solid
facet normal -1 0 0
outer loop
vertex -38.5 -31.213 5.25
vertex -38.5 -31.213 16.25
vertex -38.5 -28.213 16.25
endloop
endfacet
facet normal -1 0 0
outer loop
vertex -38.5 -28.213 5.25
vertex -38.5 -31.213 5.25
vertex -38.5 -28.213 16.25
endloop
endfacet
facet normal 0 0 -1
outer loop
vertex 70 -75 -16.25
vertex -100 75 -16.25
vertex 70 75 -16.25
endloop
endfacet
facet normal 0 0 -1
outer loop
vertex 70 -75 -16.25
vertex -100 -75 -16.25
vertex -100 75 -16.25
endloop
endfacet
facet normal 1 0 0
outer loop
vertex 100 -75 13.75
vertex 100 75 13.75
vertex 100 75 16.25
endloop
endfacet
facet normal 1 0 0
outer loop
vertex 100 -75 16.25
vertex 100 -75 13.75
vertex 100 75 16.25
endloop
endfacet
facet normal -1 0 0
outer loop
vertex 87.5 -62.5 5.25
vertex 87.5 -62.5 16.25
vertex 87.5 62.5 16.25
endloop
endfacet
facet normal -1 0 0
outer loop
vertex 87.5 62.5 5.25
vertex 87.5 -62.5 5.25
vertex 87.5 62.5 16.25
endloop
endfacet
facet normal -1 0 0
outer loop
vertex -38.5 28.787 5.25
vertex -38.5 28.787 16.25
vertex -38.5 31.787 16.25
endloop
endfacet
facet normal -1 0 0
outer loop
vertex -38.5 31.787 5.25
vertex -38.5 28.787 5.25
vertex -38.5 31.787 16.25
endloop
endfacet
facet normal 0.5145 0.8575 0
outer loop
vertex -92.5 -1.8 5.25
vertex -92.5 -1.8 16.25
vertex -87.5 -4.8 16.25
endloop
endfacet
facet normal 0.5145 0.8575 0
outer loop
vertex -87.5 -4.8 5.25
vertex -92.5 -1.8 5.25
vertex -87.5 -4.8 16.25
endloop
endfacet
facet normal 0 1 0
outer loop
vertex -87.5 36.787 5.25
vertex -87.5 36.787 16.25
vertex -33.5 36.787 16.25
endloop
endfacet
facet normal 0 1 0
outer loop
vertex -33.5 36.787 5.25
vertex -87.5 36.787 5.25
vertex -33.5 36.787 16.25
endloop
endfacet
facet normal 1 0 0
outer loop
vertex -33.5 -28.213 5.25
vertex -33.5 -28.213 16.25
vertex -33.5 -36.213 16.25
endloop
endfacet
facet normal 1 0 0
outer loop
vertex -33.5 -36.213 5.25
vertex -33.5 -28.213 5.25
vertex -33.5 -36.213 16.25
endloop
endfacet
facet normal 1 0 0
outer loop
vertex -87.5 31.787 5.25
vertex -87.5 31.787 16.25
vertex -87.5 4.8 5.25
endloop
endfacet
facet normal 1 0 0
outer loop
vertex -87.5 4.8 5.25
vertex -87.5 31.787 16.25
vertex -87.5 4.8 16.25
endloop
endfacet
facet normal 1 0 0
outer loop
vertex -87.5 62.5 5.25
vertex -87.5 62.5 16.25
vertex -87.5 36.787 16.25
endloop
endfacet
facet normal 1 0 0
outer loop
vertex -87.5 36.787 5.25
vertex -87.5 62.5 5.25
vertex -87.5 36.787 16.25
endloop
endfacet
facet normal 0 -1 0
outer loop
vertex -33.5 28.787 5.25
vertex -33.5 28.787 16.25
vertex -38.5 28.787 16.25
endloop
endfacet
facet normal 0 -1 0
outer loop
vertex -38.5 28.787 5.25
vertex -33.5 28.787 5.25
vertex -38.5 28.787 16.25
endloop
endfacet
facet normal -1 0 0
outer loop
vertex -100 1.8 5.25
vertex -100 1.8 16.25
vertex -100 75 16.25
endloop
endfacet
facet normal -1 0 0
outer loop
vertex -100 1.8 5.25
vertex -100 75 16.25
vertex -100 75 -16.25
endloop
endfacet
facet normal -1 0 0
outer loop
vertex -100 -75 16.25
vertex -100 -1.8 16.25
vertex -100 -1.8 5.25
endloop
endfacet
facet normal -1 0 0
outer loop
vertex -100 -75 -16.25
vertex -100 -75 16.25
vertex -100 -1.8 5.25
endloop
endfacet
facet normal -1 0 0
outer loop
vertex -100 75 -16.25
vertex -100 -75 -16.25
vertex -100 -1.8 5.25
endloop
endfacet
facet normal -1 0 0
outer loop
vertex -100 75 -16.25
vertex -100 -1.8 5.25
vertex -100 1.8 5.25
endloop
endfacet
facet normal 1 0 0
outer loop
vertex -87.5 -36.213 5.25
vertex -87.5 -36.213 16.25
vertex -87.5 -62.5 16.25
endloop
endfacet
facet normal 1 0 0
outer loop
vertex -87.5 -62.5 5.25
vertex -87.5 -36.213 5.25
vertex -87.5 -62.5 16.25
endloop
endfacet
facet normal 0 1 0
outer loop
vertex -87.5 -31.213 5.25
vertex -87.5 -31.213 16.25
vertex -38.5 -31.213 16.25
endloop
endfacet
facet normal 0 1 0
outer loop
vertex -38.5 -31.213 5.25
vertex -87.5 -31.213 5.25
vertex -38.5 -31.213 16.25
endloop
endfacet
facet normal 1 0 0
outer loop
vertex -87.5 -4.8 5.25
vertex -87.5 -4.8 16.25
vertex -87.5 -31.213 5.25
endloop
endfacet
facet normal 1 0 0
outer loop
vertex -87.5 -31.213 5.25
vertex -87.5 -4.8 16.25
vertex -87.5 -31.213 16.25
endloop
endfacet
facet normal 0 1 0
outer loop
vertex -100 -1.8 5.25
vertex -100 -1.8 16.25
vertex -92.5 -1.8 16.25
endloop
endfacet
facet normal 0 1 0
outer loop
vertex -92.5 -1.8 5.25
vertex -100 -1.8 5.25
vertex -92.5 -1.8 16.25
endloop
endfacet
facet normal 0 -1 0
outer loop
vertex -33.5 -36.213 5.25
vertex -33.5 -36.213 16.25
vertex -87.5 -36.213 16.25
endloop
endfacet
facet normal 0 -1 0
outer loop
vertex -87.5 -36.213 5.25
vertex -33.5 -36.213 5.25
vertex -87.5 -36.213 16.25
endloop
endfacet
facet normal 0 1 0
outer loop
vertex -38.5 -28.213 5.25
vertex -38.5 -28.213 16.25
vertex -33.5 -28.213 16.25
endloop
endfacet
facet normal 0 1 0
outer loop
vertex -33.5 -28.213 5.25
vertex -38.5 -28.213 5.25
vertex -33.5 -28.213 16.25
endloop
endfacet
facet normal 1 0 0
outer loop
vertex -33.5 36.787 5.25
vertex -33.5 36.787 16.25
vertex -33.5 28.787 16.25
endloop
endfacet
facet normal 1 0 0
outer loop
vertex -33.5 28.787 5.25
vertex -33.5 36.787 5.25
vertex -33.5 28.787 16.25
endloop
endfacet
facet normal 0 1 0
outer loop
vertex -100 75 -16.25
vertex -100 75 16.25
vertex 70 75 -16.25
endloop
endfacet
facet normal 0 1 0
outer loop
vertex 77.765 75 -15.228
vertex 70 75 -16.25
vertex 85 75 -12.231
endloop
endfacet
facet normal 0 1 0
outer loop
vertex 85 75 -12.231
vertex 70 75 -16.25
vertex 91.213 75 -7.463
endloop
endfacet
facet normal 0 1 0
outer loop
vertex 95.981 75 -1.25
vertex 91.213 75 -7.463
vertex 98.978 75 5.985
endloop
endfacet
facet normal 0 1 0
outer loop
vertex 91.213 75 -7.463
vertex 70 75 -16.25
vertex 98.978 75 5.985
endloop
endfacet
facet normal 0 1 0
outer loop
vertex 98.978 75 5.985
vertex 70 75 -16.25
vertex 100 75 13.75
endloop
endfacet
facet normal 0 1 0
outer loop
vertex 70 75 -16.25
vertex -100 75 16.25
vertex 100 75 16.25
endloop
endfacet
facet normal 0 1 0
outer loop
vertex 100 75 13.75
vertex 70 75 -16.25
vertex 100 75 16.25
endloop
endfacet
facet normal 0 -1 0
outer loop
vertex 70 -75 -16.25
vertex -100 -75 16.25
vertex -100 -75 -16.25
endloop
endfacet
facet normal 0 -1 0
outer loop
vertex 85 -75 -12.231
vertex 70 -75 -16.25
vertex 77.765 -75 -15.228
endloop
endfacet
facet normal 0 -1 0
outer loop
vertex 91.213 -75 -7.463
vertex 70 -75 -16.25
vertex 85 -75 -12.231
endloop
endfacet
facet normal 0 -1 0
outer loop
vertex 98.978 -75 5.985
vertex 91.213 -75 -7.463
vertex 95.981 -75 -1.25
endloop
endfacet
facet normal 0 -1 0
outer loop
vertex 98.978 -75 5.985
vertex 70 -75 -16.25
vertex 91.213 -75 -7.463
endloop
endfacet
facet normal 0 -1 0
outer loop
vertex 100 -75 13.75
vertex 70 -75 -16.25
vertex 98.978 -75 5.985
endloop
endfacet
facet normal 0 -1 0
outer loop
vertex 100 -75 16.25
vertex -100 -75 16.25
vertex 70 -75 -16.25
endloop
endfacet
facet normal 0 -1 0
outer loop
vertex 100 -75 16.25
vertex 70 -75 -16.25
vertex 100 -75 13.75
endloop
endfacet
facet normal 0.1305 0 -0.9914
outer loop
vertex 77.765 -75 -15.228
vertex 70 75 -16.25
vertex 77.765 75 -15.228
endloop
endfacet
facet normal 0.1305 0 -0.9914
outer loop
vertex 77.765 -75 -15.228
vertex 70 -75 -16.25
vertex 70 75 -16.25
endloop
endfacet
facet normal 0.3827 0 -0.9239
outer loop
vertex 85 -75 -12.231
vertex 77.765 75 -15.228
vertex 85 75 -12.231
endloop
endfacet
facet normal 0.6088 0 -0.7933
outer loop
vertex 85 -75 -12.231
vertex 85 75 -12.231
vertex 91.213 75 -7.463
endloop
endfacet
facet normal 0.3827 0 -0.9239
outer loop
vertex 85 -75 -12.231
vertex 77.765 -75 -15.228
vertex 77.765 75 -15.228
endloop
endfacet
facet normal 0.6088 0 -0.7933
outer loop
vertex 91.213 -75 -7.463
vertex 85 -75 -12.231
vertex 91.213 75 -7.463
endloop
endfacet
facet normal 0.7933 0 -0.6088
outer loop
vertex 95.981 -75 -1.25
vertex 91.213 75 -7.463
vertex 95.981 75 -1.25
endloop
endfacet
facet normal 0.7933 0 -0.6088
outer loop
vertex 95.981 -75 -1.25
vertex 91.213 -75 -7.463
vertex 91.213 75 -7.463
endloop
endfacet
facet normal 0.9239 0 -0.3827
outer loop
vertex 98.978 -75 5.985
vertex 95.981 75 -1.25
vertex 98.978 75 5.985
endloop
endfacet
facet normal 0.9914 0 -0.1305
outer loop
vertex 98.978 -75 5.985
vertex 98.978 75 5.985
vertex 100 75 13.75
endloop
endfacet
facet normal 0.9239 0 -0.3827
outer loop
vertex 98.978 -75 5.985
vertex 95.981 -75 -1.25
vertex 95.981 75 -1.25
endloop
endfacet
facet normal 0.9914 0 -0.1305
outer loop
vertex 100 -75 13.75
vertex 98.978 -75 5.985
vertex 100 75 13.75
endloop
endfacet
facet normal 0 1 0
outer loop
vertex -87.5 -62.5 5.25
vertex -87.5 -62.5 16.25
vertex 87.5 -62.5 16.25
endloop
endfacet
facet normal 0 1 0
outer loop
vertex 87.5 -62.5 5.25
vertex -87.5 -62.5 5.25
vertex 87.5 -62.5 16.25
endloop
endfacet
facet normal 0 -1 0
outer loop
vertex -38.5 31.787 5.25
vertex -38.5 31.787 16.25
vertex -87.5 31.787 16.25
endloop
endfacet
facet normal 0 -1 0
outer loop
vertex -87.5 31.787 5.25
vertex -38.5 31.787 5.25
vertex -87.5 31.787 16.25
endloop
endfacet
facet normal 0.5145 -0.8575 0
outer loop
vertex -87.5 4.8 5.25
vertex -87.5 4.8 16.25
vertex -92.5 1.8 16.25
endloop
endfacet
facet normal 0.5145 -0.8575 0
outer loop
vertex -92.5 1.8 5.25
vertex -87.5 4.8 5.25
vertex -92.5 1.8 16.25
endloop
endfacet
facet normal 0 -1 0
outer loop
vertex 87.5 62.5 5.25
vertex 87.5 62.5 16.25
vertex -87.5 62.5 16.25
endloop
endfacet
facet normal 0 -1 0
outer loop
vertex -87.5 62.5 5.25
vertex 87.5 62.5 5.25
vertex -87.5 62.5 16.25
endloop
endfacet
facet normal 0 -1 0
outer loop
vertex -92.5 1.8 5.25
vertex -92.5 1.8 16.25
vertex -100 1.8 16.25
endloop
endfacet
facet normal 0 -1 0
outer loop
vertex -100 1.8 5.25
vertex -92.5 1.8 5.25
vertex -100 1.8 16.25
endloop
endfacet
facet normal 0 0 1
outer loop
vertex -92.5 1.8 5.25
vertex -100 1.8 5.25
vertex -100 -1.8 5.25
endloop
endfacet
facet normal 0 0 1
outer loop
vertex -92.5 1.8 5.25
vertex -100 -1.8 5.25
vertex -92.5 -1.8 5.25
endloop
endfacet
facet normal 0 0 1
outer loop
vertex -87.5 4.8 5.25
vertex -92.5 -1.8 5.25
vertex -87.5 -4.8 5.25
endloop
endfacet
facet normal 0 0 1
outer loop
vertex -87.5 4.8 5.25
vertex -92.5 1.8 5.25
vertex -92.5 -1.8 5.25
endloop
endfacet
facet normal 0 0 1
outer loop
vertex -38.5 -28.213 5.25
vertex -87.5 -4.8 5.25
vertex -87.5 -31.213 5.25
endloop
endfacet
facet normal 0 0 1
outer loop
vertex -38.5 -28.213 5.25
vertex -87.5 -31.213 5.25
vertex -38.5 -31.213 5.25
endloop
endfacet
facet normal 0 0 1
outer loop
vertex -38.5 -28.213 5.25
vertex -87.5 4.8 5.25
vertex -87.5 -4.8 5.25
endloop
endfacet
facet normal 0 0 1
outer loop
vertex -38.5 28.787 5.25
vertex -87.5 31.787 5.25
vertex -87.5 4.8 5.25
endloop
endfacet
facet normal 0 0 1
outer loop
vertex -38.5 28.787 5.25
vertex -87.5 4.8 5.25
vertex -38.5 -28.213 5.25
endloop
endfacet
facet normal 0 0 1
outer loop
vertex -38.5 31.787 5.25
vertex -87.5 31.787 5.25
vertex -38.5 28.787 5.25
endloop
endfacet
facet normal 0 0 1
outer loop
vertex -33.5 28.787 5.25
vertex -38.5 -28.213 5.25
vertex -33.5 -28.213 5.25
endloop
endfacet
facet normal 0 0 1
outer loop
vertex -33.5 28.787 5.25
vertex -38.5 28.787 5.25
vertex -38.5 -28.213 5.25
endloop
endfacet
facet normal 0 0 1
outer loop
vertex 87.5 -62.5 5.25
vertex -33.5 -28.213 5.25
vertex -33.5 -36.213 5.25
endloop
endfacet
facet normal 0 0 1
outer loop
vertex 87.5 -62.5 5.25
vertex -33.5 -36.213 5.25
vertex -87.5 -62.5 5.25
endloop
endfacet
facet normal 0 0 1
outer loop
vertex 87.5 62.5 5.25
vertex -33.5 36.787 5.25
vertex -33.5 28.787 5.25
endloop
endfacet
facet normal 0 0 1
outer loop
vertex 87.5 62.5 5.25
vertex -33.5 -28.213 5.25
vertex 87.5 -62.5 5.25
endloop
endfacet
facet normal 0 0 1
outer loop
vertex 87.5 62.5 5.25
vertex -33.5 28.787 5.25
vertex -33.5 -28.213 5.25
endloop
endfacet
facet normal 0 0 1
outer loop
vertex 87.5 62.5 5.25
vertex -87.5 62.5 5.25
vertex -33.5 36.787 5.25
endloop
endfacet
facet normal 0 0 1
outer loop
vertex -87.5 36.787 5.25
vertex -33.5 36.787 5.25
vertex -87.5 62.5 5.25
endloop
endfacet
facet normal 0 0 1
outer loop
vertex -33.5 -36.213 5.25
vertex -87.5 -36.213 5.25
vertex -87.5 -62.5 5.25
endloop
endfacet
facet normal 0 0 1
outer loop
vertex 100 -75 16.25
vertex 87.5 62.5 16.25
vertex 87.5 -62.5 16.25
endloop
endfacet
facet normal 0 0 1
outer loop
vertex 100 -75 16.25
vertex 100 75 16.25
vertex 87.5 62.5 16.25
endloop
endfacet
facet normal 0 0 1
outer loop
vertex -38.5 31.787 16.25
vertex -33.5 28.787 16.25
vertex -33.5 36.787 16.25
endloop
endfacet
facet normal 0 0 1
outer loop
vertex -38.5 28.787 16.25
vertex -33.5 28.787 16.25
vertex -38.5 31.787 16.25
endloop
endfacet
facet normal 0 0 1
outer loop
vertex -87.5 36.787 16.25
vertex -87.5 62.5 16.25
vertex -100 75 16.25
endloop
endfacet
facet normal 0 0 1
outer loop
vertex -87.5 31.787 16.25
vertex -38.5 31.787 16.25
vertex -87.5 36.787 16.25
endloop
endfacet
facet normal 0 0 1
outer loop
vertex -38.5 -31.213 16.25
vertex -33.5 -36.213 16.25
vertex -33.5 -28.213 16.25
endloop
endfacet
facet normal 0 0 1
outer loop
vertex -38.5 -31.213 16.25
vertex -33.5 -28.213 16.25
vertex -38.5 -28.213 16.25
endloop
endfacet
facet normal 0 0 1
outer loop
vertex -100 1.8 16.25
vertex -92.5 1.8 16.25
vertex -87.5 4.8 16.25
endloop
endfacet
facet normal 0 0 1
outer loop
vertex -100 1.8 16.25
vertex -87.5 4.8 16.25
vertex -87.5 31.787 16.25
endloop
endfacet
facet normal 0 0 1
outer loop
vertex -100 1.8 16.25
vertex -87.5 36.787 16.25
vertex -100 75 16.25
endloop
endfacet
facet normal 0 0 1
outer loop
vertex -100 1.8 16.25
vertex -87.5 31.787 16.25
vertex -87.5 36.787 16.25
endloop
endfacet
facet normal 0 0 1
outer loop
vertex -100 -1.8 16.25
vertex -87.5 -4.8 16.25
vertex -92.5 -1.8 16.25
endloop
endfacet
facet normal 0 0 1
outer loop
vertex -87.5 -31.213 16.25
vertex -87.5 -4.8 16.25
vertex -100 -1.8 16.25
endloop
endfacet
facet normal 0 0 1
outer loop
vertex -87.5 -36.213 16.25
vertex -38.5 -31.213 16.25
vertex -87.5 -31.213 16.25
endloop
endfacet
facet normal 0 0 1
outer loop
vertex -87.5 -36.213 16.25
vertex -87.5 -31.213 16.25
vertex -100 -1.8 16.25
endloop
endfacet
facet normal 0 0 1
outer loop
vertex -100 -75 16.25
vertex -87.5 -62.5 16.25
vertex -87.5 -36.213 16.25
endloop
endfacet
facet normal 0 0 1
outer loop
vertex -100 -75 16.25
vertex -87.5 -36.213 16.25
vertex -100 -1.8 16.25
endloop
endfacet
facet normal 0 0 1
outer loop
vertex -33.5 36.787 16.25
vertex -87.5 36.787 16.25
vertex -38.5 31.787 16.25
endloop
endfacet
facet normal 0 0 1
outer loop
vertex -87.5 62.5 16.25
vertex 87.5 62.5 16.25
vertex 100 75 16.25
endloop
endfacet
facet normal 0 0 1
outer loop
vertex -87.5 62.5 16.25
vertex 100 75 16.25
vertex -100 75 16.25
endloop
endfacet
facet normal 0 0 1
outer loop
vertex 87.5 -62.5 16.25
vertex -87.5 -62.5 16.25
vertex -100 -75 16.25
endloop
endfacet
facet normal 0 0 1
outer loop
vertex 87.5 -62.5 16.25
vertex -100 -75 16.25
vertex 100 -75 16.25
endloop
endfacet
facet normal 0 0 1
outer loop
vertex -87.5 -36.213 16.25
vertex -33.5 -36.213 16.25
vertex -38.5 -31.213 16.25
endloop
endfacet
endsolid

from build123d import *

# Parameters (mm, degrees)
F1_DEPTH = 75
F2_W     = 10
F2_H     = 12.5
F3_DEPTH = 11


with BuildPart() as f1:
    # F0 (on Front) → F1 (new body, symmetric)
    with BuildSketch(Plane.XZ):
        with BuildLine():
            Line((100, 13.75), (100, 16.25))
            Line((100, 16.25), (-100, 16.25))
            Line((-100, 16.25), (-100, -16.25))
            Line((-100, -16.25), (70, -16.25))
            ThreePointArc((70, -16.25), (91.2132034356, -7.4632034356), (100, 13.75))
        make_face()
    extrude(amount=F1_DEPTH, both=True)

    # F2 (on face) → F3 (cut)
    with BuildSketch(Plane.XY.offset(16.25)):
        Polygon((87.5, -62.5), (87.5, 62.5), (-87.5, 62.5), (-87.5, 36.7867040902), (-41, 36.7867040902), (-33.5, 36.7867040902), (-33.5, 28.7867040902), (-38.5, 28.7867040902), (-38.5, 31.7867040902), (-46, 31.7867040902), (-87.5, 31.7867040902), (-87.5, 4.8), (-92.5, 1.8), (-100, 1.8), (-100, -1.8), (-92.5, -1.8), (-87.5, -4.8), (-87.5, -31.2132959098), (-38.5, -31.2132959098), (-38.5, -28.2132959098), (-33.5, -28.2132959098), (-33.5, -36.2132959098), (-41, -36.2132959098), (-46, -36.2132959098), (-87.5, -36.2132959098), (-87.5, -62.5), (-77.5, -62.5), align=None)
        with BuildLine():
            Line((-77.3618234992, 52.5), (-74.3618234992, 52.5))
            Line((-74.3618234992, 52.5), (60.6381765008, 52.5))
            Line((60.6381765008, 52.5), (74.5, 52.5))
            Line((74.5, 52.5), (77.5, 52.5))
            Line((77.5, 52.5), (77.5, 49.5))
            Line((77.5, 49.5), (77.5, -52.5))
            Line((77.5, -52.5), (60.6381765008, -52.5))
            Line((60.6381765008, -52.5), (-77.5, -52.5))
            Line((-77.5, -52.5), (-77.5, -49.5))
            Line((-77.5, -49.5), (60.6381765008, -49.5))
            Line((60.6381765008, -49.5), (69.5, -49.5))
            ThreePointArc((69.5, -49.5), (73.0355339059, -48.0355339059), (74.5, -44.5))
            Line((74.5, -44.5), (74.5, 44.5))
            ThreePointArc((74.5, 44.5), (73.0355339059, 48.0355339059), (69.5, 49.5))
            Line((69.5, 49.5), (60.6381765008, 49.5))
            Line((60.6381765008, 49.5), (57.6381765008, 49.5))
            Line((57.6381765008, 49.5), (-74.3618234992, 49.5))
            Line((-74.3618234992, 49.5), (-77.3618234992, 49.5))
            Line((-77.3618234992, 49.5), (-77.3618234992, 52.5))
        make_face(mode=Mode.SUBTRACT)
        Polygon((40, -25), (40, 0), (40, 25), (40, 37.5), (50, 37.5), (50, 25), (50, -25), (50, -37.5), (40, -37.5), align=None, mode=Mode.SUBTRACT)
        with Locations((45, 31.25)):
            Rectangle(F2_W, F2_H)
        with Locations((45, -31.25)):
            Rectangle(F2_W, F2_H)
        Polygon((40, 25), (40, 0), (40, -25), (50, -25), (50, 25), align=None)
        with BuildLine():
            Line((60.6381765008, 52.5), (-74.3618234992, 52.5))
            Line((-74.3618234992, 52.5), (-77.3618234992, 52.5))
            Line((-77.3618234992, 52.5), (-77.3618234992, 49.5))
            Line((-77.3618234992, 49.5), (-74.3618234992, 49.5))
            Line((-74.3618234992, 49.5), (57.6381765008, 49.5))
            Line((57.6381765008, 49.5), (60.6381765008, 49.5))
            Line((60.6381765008, 49.5), (69.5, 49.5))
            ThreePointArc((69.5, 49.5), (73.0355339059, 48.0355339059), (74.5, 44.5))
            Line((74.5, 44.5), (74.5, -44.5))
            ThreePointArc((74.5, -44.5), (73.0355339059, -48.0355339059), (69.5, -49.5))
            Line((69.5, -49.5), (60.6381765008, -49.5))
            Line((60.6381765008, -49.5), (-77.5, -49.5))
            Line((-77.5, -49.5), (-77.5, -52.5))
            Line((-77.5, -52.5), (60.6381765008, -52.5))
            Line((60.6381765008, -52.5), (77.5, -52.5))
            Line((77.5, -52.5), (77.5, 49.5))
            Line((77.5, 49.5), (77.5, 52.5))
            Line((77.5, 52.5), (74.5, 52.5))
            Line((74.5, 52.5), (60.6381765008, 52.5))
        make_face()
    extrude(amount=-F3_DEPTH, mode=Mode.SUBTRACT)


solid = f1.part
